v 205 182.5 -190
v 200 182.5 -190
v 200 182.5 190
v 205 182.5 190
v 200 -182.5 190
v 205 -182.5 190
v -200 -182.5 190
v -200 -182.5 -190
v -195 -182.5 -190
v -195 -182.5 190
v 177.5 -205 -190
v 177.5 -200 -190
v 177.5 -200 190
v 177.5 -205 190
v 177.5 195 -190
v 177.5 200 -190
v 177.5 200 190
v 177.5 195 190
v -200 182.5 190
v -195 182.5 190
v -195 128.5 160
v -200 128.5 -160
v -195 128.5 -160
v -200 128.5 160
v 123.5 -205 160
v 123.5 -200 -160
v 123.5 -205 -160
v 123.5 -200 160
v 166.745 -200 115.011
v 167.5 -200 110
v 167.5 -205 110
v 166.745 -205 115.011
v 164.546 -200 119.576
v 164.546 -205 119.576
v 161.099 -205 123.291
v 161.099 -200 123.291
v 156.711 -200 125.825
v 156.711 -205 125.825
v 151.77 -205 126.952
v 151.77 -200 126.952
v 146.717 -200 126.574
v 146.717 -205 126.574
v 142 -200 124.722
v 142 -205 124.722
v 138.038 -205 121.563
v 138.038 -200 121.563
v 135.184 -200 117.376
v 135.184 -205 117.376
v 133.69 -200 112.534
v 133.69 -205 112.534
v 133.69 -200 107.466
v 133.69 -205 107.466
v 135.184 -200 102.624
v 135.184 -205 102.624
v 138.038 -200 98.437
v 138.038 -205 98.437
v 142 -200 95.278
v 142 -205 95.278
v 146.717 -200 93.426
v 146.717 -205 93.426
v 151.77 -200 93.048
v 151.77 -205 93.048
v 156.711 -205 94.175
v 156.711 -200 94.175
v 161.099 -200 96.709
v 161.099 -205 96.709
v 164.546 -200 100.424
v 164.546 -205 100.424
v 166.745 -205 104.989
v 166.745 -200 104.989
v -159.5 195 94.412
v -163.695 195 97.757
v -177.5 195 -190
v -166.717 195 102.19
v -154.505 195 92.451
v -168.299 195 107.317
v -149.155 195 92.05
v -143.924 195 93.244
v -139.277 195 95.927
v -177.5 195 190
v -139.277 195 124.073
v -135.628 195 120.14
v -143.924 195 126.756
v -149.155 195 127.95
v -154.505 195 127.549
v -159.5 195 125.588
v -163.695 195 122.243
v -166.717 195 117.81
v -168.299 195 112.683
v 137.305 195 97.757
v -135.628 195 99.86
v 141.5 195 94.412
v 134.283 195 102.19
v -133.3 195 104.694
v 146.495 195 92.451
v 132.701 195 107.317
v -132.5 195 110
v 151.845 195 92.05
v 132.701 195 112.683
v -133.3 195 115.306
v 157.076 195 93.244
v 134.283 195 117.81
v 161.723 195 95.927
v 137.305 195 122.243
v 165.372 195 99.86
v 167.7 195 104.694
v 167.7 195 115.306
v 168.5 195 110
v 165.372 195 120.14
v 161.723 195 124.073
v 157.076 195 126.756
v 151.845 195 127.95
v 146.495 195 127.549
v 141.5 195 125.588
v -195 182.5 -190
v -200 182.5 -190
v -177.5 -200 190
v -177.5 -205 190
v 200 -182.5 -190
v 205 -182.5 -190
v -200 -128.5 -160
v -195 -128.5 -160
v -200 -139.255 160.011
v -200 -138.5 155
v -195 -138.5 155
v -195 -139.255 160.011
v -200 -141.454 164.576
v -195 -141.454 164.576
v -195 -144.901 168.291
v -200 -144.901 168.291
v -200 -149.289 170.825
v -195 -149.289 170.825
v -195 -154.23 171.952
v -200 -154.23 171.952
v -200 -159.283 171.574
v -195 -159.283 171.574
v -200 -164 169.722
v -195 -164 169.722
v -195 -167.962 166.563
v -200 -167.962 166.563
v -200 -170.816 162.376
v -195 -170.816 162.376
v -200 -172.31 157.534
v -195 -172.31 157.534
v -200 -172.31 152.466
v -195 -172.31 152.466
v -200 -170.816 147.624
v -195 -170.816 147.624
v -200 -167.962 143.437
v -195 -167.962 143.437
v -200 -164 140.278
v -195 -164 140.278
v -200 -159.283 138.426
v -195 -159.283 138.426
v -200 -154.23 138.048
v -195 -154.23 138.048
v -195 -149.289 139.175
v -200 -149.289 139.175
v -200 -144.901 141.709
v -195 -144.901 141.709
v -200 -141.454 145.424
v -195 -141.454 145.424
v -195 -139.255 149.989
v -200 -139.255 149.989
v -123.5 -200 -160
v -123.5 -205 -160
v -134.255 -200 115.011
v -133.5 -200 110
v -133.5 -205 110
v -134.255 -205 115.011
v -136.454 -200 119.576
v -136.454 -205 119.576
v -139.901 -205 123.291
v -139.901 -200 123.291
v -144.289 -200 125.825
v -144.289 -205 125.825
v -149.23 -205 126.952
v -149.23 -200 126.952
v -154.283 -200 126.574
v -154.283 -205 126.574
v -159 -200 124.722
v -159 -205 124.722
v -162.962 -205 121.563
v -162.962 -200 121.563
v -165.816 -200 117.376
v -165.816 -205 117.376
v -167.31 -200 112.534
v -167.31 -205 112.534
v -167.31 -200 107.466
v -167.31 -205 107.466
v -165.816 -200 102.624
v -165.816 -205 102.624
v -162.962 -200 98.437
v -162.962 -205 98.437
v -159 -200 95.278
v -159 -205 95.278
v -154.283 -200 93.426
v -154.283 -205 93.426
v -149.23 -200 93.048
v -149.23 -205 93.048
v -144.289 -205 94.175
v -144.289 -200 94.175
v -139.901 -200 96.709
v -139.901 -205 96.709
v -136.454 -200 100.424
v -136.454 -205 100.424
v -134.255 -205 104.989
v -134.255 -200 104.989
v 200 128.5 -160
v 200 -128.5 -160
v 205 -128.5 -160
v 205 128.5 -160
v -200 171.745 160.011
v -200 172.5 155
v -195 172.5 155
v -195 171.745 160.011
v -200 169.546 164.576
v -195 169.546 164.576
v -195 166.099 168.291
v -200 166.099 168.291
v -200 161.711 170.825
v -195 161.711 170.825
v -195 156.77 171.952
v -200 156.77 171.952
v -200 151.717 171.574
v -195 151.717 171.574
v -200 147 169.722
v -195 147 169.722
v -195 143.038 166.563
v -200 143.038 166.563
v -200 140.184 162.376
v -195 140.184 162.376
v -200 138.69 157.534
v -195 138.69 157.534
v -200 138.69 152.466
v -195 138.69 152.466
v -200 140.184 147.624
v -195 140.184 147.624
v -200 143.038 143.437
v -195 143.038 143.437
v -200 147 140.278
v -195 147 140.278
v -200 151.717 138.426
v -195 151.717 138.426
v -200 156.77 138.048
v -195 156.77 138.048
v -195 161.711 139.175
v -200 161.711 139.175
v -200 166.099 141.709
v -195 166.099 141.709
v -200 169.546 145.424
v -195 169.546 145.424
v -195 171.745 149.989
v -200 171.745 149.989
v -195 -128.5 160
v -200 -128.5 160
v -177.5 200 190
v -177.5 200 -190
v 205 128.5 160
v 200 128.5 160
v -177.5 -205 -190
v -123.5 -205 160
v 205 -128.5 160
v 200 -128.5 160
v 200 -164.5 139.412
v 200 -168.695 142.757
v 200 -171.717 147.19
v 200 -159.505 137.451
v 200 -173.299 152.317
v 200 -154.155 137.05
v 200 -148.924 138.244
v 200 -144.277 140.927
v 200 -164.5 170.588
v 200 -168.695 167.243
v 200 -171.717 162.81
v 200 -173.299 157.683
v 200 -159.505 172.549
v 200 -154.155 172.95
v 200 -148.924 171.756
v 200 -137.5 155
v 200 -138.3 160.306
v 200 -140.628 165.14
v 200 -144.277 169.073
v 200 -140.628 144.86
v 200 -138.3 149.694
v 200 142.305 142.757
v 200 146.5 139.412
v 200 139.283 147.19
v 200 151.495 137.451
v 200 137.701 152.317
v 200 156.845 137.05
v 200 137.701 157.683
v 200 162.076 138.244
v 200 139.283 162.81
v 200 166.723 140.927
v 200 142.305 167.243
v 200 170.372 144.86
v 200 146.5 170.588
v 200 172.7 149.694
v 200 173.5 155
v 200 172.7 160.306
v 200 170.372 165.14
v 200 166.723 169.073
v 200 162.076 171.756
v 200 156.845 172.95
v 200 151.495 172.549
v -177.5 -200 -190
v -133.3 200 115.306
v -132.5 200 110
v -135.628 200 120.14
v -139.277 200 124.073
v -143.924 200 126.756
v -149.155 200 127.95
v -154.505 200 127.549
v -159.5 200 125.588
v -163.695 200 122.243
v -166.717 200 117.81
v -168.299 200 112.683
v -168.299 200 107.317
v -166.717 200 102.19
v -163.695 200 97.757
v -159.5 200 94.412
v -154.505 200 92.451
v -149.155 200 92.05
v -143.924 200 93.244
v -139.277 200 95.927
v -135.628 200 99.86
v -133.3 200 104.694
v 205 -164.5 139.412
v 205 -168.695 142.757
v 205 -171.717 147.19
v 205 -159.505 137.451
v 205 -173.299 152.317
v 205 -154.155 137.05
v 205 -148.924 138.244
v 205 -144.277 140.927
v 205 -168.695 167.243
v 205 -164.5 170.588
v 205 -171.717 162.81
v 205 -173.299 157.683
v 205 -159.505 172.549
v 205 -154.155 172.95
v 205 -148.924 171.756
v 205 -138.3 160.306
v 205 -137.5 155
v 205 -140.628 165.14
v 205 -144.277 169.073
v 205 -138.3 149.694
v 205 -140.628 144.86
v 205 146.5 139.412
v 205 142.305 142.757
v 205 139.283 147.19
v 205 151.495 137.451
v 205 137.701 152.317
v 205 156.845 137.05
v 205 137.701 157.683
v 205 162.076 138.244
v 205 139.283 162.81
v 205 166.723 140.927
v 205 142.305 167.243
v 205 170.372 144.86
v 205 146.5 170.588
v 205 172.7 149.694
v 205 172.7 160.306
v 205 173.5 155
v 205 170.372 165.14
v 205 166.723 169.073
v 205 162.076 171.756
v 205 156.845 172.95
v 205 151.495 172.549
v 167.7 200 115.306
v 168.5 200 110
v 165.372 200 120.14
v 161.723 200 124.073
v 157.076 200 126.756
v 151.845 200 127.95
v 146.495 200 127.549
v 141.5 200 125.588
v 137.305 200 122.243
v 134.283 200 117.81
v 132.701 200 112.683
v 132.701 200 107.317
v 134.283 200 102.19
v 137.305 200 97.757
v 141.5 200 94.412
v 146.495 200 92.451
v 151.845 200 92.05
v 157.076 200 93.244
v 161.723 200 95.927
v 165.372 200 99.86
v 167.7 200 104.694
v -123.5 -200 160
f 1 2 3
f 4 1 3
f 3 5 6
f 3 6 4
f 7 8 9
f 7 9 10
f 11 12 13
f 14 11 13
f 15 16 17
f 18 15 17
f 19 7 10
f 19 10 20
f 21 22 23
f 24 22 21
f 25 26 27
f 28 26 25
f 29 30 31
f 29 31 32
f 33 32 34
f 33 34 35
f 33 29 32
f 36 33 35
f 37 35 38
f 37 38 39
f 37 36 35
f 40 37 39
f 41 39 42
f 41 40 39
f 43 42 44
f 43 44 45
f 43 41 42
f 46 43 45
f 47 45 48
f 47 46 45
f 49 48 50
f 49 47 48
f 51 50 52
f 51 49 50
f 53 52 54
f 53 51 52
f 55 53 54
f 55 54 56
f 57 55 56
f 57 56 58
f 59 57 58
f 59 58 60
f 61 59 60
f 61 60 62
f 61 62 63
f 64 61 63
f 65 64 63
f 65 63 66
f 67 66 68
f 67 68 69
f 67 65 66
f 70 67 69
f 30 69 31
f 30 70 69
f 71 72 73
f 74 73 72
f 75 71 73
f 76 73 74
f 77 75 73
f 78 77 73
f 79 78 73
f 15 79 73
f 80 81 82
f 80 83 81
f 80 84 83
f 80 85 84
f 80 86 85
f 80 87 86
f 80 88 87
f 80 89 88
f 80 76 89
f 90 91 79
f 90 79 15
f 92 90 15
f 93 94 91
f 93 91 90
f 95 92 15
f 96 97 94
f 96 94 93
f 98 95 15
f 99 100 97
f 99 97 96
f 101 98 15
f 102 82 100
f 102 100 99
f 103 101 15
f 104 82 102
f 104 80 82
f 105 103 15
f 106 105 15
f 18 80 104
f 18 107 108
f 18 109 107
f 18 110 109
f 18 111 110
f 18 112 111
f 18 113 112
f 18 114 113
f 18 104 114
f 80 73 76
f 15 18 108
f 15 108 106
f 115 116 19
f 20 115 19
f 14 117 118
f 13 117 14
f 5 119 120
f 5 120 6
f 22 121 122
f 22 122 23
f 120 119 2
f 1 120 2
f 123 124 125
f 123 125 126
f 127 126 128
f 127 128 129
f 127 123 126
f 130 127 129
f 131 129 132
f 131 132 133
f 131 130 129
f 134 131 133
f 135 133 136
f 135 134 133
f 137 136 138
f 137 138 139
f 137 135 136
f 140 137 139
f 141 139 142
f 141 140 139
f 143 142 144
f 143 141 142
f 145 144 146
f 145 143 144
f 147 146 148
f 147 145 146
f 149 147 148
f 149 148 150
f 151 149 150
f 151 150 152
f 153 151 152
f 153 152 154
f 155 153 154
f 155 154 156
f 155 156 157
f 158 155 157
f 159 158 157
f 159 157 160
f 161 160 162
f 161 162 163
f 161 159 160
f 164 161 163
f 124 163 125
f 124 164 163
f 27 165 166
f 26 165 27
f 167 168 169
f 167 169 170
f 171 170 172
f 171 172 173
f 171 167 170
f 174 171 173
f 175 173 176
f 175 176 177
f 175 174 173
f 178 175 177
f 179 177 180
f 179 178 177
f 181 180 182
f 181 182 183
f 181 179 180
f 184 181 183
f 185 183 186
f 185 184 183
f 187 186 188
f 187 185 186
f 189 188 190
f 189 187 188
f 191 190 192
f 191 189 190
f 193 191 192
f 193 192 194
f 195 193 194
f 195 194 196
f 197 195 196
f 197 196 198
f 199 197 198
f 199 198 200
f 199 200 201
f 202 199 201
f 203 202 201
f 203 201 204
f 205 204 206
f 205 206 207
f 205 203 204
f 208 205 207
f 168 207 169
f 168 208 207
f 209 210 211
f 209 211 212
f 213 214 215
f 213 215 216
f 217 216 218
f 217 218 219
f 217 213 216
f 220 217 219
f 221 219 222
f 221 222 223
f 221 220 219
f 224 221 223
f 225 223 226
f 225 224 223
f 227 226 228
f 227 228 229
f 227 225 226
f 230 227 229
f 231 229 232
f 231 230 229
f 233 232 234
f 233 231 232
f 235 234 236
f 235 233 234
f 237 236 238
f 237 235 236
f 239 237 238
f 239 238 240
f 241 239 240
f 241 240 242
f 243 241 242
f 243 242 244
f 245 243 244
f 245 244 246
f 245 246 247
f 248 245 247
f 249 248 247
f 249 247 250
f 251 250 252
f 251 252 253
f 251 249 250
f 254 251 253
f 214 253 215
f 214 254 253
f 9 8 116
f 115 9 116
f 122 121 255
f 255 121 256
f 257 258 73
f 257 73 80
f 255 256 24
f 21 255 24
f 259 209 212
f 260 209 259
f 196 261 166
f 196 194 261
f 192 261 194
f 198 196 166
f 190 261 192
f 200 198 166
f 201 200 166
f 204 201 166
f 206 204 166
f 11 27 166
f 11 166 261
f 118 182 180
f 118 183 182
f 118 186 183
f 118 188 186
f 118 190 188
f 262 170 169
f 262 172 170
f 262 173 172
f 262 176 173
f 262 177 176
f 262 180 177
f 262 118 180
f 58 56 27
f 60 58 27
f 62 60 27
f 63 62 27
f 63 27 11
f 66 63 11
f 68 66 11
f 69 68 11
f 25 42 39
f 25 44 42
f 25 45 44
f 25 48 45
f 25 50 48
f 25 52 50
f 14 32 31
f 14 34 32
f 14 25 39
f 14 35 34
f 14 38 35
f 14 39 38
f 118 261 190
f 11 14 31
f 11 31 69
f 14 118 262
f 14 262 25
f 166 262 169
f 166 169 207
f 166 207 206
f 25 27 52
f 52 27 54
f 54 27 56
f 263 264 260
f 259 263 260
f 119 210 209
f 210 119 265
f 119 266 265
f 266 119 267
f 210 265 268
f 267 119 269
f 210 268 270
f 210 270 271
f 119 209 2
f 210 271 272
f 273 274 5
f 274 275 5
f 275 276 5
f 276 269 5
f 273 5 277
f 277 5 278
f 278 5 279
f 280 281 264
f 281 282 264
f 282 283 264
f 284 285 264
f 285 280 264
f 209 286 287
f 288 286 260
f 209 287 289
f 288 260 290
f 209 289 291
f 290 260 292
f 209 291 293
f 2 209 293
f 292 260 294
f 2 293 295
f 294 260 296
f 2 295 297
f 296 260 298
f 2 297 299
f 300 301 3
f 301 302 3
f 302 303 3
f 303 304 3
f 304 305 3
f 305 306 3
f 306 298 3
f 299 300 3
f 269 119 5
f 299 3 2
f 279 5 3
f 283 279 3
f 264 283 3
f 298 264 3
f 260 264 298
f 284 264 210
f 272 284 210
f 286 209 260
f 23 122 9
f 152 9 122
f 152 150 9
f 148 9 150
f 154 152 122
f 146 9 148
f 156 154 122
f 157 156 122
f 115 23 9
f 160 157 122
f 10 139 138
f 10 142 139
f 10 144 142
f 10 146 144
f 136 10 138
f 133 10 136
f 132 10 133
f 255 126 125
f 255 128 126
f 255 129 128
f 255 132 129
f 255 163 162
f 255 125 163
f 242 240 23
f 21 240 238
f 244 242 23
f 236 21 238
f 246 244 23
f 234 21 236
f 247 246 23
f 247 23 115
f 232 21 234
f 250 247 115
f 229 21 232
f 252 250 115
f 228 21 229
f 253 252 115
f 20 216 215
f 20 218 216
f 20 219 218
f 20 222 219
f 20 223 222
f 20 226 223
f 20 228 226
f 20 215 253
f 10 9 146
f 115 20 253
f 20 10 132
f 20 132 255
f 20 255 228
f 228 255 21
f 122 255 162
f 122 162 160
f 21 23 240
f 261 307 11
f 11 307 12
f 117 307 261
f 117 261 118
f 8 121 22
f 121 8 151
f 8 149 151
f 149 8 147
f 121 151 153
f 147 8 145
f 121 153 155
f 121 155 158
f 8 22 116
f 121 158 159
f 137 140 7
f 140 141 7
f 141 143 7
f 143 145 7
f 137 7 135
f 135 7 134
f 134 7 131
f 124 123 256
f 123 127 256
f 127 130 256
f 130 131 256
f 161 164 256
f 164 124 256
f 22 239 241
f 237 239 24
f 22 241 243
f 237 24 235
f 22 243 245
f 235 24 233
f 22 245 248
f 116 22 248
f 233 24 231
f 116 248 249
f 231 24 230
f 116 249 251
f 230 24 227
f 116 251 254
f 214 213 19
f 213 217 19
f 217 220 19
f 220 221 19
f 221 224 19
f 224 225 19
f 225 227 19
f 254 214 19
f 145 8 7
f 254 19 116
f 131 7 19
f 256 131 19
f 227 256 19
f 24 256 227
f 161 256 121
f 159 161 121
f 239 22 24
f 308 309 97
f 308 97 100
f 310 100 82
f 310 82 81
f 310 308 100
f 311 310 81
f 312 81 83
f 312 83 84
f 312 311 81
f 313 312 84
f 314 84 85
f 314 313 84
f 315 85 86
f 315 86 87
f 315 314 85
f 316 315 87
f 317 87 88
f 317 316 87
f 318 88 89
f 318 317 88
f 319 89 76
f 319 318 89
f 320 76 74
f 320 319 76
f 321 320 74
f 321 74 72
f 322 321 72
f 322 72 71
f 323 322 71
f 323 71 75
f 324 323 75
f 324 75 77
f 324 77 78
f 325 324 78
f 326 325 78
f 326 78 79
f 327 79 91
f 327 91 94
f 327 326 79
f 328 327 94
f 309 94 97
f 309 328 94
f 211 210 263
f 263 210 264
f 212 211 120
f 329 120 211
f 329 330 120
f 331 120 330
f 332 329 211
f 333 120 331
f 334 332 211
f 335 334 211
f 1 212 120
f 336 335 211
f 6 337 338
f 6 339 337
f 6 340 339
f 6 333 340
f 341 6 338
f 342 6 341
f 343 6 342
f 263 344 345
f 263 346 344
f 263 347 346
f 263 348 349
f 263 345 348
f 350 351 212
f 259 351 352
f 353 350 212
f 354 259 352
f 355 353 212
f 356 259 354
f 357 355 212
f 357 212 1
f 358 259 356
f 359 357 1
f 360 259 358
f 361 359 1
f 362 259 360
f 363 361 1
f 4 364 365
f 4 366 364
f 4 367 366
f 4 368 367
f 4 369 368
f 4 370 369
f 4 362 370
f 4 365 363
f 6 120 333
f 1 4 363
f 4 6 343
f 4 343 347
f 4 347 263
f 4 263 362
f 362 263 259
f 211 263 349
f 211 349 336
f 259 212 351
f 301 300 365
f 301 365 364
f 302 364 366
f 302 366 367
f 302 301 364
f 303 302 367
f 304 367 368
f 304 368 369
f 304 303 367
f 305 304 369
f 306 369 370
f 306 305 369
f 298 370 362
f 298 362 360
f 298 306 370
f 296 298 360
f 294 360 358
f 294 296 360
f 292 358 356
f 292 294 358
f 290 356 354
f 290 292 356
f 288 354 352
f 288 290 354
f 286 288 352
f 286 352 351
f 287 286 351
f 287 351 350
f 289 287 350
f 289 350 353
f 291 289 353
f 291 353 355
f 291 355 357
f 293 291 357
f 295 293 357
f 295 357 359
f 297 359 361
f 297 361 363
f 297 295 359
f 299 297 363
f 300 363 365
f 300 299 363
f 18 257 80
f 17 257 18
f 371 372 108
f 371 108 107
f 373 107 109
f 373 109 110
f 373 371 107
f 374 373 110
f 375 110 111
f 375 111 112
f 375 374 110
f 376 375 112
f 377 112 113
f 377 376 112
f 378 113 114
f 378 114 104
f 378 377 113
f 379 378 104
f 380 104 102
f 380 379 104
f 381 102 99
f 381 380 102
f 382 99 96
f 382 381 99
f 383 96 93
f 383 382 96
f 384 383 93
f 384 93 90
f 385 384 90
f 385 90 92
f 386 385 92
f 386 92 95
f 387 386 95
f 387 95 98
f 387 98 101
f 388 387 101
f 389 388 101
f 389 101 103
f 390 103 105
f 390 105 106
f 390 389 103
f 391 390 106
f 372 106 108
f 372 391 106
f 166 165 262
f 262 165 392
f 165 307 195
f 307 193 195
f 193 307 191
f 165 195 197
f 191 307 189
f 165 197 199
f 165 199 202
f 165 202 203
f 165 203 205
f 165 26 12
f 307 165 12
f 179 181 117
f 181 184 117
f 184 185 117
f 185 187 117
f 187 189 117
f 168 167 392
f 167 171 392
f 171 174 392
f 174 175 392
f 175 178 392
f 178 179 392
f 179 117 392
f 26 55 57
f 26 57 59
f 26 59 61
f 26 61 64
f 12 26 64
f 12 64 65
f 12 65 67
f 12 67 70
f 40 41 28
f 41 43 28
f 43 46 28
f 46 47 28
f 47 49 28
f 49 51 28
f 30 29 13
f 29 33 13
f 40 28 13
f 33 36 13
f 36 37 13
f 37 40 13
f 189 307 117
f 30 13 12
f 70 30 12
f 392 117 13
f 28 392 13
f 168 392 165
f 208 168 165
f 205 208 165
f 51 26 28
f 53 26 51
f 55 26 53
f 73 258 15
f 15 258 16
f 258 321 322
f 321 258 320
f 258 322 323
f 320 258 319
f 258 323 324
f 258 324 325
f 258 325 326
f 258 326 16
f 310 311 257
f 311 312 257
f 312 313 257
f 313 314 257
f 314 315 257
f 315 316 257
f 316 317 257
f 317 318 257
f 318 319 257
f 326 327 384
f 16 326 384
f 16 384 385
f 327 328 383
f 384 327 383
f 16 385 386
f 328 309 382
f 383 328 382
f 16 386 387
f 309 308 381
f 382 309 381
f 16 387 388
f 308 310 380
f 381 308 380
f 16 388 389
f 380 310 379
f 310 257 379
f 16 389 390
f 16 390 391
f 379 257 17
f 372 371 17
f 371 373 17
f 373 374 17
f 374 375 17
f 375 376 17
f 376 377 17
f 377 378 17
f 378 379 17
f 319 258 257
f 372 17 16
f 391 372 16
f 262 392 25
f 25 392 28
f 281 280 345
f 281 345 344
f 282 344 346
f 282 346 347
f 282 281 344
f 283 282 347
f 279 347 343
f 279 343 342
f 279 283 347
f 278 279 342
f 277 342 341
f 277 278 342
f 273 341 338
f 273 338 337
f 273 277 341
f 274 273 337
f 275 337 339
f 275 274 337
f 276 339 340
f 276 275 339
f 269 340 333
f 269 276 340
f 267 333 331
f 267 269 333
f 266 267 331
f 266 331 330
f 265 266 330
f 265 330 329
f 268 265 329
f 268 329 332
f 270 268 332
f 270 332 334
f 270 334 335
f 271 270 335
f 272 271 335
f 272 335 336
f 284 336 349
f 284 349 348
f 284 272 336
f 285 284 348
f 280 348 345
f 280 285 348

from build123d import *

# Parameters (mm, degrees)
F5_W      = 365
F5_H      = 380
F5_R      = 18
F5_W_2    = 257
F5_H_2    = 320
F9_DEPTH  = 5
F6_W      = 355
F6_H      = 380
F6_R      = 18
F10_DEPTH = 5
F7_W      = 355
F7_H      = 380
F7_R      = 17
F7_W_2    = 247
F7_H_2    = 320
F11_DEPTH = 5
F8_W      = 365
F8_H      = 380
F8_R      = 17
F8_W_2    = 257
F8_H_2    = 320
F12_DEPTH = 5


with BuildPart() as f9:
    # F5 (on offset) → F9 (new body)
    with BuildSketch(Plane.YZ.offset(200)):
        Rectangle(F5_W, F5_H)
        with Locations((-155.5, 155)):
            Circle(F5_R, mode=Mode.SUBTRACT)
        Rectangle(F5_W_2, F5_H_2, mode=Mode.SUBTRACT)
        with Locations((155.5, 155)):
            Circle(F5_R, mode=Mode.SUBTRACT)
    extrude(amount=F9_DEPTH)


with BuildPart() as f10:
    # F6 (on offset) → F10 (new body)
    with BuildSketch(Plane.XZ.offset(-200)):
        Rectangle(F6_W, F6_H)
        with Locations((-150.5, 110)):
            Circle(F6_R, mode=Mode.SUBTRACT)
        with Locations((150.5, 110)):
            Circle(F6_R, mode=Mode.SUBTRACT)
    extrude(amount=F10_DEPTH)


with BuildPart() as f11:
    # F7 (on offset) → F11 (new body)
    with BuildSketch(Plane.XZ.offset(200)):
        Rectangle(F7_W, F7_H)
        with Locations((-150.5, 110)):
            Circle(F7_R, mode=Mode.SUBTRACT)
        Rectangle(F7_W_2, F7_H_2, mode=Mode.SUBTRACT)
        with Locations((150.5, 110)):
            Circle(F7_R, mode=Mode.SUBTRACT)
    extrude(amount=F11_DEPTH)


with BuildPart() as f12:
    # F8 (on offset) → F12 (new body)
    with BuildSketch(Plane.YZ.offset(-200)):
        Rectangle(F8_W, F8_H)
        with Locations((-155.5, 155)):
            Circle(F8_R, mode=Mode.SUBTRACT)
        Rectangle(F8_W_2, F8_H_2, mode=Mode.SUBTRACT)
        with Locations((155.5, 155)):
            Circle(F8_R, mode=Mode.SUBTRACT)
    extrude(amount=F12_DEPTH)


solid = Compound([f9.part, f10.part, f11.part, f12.part])
